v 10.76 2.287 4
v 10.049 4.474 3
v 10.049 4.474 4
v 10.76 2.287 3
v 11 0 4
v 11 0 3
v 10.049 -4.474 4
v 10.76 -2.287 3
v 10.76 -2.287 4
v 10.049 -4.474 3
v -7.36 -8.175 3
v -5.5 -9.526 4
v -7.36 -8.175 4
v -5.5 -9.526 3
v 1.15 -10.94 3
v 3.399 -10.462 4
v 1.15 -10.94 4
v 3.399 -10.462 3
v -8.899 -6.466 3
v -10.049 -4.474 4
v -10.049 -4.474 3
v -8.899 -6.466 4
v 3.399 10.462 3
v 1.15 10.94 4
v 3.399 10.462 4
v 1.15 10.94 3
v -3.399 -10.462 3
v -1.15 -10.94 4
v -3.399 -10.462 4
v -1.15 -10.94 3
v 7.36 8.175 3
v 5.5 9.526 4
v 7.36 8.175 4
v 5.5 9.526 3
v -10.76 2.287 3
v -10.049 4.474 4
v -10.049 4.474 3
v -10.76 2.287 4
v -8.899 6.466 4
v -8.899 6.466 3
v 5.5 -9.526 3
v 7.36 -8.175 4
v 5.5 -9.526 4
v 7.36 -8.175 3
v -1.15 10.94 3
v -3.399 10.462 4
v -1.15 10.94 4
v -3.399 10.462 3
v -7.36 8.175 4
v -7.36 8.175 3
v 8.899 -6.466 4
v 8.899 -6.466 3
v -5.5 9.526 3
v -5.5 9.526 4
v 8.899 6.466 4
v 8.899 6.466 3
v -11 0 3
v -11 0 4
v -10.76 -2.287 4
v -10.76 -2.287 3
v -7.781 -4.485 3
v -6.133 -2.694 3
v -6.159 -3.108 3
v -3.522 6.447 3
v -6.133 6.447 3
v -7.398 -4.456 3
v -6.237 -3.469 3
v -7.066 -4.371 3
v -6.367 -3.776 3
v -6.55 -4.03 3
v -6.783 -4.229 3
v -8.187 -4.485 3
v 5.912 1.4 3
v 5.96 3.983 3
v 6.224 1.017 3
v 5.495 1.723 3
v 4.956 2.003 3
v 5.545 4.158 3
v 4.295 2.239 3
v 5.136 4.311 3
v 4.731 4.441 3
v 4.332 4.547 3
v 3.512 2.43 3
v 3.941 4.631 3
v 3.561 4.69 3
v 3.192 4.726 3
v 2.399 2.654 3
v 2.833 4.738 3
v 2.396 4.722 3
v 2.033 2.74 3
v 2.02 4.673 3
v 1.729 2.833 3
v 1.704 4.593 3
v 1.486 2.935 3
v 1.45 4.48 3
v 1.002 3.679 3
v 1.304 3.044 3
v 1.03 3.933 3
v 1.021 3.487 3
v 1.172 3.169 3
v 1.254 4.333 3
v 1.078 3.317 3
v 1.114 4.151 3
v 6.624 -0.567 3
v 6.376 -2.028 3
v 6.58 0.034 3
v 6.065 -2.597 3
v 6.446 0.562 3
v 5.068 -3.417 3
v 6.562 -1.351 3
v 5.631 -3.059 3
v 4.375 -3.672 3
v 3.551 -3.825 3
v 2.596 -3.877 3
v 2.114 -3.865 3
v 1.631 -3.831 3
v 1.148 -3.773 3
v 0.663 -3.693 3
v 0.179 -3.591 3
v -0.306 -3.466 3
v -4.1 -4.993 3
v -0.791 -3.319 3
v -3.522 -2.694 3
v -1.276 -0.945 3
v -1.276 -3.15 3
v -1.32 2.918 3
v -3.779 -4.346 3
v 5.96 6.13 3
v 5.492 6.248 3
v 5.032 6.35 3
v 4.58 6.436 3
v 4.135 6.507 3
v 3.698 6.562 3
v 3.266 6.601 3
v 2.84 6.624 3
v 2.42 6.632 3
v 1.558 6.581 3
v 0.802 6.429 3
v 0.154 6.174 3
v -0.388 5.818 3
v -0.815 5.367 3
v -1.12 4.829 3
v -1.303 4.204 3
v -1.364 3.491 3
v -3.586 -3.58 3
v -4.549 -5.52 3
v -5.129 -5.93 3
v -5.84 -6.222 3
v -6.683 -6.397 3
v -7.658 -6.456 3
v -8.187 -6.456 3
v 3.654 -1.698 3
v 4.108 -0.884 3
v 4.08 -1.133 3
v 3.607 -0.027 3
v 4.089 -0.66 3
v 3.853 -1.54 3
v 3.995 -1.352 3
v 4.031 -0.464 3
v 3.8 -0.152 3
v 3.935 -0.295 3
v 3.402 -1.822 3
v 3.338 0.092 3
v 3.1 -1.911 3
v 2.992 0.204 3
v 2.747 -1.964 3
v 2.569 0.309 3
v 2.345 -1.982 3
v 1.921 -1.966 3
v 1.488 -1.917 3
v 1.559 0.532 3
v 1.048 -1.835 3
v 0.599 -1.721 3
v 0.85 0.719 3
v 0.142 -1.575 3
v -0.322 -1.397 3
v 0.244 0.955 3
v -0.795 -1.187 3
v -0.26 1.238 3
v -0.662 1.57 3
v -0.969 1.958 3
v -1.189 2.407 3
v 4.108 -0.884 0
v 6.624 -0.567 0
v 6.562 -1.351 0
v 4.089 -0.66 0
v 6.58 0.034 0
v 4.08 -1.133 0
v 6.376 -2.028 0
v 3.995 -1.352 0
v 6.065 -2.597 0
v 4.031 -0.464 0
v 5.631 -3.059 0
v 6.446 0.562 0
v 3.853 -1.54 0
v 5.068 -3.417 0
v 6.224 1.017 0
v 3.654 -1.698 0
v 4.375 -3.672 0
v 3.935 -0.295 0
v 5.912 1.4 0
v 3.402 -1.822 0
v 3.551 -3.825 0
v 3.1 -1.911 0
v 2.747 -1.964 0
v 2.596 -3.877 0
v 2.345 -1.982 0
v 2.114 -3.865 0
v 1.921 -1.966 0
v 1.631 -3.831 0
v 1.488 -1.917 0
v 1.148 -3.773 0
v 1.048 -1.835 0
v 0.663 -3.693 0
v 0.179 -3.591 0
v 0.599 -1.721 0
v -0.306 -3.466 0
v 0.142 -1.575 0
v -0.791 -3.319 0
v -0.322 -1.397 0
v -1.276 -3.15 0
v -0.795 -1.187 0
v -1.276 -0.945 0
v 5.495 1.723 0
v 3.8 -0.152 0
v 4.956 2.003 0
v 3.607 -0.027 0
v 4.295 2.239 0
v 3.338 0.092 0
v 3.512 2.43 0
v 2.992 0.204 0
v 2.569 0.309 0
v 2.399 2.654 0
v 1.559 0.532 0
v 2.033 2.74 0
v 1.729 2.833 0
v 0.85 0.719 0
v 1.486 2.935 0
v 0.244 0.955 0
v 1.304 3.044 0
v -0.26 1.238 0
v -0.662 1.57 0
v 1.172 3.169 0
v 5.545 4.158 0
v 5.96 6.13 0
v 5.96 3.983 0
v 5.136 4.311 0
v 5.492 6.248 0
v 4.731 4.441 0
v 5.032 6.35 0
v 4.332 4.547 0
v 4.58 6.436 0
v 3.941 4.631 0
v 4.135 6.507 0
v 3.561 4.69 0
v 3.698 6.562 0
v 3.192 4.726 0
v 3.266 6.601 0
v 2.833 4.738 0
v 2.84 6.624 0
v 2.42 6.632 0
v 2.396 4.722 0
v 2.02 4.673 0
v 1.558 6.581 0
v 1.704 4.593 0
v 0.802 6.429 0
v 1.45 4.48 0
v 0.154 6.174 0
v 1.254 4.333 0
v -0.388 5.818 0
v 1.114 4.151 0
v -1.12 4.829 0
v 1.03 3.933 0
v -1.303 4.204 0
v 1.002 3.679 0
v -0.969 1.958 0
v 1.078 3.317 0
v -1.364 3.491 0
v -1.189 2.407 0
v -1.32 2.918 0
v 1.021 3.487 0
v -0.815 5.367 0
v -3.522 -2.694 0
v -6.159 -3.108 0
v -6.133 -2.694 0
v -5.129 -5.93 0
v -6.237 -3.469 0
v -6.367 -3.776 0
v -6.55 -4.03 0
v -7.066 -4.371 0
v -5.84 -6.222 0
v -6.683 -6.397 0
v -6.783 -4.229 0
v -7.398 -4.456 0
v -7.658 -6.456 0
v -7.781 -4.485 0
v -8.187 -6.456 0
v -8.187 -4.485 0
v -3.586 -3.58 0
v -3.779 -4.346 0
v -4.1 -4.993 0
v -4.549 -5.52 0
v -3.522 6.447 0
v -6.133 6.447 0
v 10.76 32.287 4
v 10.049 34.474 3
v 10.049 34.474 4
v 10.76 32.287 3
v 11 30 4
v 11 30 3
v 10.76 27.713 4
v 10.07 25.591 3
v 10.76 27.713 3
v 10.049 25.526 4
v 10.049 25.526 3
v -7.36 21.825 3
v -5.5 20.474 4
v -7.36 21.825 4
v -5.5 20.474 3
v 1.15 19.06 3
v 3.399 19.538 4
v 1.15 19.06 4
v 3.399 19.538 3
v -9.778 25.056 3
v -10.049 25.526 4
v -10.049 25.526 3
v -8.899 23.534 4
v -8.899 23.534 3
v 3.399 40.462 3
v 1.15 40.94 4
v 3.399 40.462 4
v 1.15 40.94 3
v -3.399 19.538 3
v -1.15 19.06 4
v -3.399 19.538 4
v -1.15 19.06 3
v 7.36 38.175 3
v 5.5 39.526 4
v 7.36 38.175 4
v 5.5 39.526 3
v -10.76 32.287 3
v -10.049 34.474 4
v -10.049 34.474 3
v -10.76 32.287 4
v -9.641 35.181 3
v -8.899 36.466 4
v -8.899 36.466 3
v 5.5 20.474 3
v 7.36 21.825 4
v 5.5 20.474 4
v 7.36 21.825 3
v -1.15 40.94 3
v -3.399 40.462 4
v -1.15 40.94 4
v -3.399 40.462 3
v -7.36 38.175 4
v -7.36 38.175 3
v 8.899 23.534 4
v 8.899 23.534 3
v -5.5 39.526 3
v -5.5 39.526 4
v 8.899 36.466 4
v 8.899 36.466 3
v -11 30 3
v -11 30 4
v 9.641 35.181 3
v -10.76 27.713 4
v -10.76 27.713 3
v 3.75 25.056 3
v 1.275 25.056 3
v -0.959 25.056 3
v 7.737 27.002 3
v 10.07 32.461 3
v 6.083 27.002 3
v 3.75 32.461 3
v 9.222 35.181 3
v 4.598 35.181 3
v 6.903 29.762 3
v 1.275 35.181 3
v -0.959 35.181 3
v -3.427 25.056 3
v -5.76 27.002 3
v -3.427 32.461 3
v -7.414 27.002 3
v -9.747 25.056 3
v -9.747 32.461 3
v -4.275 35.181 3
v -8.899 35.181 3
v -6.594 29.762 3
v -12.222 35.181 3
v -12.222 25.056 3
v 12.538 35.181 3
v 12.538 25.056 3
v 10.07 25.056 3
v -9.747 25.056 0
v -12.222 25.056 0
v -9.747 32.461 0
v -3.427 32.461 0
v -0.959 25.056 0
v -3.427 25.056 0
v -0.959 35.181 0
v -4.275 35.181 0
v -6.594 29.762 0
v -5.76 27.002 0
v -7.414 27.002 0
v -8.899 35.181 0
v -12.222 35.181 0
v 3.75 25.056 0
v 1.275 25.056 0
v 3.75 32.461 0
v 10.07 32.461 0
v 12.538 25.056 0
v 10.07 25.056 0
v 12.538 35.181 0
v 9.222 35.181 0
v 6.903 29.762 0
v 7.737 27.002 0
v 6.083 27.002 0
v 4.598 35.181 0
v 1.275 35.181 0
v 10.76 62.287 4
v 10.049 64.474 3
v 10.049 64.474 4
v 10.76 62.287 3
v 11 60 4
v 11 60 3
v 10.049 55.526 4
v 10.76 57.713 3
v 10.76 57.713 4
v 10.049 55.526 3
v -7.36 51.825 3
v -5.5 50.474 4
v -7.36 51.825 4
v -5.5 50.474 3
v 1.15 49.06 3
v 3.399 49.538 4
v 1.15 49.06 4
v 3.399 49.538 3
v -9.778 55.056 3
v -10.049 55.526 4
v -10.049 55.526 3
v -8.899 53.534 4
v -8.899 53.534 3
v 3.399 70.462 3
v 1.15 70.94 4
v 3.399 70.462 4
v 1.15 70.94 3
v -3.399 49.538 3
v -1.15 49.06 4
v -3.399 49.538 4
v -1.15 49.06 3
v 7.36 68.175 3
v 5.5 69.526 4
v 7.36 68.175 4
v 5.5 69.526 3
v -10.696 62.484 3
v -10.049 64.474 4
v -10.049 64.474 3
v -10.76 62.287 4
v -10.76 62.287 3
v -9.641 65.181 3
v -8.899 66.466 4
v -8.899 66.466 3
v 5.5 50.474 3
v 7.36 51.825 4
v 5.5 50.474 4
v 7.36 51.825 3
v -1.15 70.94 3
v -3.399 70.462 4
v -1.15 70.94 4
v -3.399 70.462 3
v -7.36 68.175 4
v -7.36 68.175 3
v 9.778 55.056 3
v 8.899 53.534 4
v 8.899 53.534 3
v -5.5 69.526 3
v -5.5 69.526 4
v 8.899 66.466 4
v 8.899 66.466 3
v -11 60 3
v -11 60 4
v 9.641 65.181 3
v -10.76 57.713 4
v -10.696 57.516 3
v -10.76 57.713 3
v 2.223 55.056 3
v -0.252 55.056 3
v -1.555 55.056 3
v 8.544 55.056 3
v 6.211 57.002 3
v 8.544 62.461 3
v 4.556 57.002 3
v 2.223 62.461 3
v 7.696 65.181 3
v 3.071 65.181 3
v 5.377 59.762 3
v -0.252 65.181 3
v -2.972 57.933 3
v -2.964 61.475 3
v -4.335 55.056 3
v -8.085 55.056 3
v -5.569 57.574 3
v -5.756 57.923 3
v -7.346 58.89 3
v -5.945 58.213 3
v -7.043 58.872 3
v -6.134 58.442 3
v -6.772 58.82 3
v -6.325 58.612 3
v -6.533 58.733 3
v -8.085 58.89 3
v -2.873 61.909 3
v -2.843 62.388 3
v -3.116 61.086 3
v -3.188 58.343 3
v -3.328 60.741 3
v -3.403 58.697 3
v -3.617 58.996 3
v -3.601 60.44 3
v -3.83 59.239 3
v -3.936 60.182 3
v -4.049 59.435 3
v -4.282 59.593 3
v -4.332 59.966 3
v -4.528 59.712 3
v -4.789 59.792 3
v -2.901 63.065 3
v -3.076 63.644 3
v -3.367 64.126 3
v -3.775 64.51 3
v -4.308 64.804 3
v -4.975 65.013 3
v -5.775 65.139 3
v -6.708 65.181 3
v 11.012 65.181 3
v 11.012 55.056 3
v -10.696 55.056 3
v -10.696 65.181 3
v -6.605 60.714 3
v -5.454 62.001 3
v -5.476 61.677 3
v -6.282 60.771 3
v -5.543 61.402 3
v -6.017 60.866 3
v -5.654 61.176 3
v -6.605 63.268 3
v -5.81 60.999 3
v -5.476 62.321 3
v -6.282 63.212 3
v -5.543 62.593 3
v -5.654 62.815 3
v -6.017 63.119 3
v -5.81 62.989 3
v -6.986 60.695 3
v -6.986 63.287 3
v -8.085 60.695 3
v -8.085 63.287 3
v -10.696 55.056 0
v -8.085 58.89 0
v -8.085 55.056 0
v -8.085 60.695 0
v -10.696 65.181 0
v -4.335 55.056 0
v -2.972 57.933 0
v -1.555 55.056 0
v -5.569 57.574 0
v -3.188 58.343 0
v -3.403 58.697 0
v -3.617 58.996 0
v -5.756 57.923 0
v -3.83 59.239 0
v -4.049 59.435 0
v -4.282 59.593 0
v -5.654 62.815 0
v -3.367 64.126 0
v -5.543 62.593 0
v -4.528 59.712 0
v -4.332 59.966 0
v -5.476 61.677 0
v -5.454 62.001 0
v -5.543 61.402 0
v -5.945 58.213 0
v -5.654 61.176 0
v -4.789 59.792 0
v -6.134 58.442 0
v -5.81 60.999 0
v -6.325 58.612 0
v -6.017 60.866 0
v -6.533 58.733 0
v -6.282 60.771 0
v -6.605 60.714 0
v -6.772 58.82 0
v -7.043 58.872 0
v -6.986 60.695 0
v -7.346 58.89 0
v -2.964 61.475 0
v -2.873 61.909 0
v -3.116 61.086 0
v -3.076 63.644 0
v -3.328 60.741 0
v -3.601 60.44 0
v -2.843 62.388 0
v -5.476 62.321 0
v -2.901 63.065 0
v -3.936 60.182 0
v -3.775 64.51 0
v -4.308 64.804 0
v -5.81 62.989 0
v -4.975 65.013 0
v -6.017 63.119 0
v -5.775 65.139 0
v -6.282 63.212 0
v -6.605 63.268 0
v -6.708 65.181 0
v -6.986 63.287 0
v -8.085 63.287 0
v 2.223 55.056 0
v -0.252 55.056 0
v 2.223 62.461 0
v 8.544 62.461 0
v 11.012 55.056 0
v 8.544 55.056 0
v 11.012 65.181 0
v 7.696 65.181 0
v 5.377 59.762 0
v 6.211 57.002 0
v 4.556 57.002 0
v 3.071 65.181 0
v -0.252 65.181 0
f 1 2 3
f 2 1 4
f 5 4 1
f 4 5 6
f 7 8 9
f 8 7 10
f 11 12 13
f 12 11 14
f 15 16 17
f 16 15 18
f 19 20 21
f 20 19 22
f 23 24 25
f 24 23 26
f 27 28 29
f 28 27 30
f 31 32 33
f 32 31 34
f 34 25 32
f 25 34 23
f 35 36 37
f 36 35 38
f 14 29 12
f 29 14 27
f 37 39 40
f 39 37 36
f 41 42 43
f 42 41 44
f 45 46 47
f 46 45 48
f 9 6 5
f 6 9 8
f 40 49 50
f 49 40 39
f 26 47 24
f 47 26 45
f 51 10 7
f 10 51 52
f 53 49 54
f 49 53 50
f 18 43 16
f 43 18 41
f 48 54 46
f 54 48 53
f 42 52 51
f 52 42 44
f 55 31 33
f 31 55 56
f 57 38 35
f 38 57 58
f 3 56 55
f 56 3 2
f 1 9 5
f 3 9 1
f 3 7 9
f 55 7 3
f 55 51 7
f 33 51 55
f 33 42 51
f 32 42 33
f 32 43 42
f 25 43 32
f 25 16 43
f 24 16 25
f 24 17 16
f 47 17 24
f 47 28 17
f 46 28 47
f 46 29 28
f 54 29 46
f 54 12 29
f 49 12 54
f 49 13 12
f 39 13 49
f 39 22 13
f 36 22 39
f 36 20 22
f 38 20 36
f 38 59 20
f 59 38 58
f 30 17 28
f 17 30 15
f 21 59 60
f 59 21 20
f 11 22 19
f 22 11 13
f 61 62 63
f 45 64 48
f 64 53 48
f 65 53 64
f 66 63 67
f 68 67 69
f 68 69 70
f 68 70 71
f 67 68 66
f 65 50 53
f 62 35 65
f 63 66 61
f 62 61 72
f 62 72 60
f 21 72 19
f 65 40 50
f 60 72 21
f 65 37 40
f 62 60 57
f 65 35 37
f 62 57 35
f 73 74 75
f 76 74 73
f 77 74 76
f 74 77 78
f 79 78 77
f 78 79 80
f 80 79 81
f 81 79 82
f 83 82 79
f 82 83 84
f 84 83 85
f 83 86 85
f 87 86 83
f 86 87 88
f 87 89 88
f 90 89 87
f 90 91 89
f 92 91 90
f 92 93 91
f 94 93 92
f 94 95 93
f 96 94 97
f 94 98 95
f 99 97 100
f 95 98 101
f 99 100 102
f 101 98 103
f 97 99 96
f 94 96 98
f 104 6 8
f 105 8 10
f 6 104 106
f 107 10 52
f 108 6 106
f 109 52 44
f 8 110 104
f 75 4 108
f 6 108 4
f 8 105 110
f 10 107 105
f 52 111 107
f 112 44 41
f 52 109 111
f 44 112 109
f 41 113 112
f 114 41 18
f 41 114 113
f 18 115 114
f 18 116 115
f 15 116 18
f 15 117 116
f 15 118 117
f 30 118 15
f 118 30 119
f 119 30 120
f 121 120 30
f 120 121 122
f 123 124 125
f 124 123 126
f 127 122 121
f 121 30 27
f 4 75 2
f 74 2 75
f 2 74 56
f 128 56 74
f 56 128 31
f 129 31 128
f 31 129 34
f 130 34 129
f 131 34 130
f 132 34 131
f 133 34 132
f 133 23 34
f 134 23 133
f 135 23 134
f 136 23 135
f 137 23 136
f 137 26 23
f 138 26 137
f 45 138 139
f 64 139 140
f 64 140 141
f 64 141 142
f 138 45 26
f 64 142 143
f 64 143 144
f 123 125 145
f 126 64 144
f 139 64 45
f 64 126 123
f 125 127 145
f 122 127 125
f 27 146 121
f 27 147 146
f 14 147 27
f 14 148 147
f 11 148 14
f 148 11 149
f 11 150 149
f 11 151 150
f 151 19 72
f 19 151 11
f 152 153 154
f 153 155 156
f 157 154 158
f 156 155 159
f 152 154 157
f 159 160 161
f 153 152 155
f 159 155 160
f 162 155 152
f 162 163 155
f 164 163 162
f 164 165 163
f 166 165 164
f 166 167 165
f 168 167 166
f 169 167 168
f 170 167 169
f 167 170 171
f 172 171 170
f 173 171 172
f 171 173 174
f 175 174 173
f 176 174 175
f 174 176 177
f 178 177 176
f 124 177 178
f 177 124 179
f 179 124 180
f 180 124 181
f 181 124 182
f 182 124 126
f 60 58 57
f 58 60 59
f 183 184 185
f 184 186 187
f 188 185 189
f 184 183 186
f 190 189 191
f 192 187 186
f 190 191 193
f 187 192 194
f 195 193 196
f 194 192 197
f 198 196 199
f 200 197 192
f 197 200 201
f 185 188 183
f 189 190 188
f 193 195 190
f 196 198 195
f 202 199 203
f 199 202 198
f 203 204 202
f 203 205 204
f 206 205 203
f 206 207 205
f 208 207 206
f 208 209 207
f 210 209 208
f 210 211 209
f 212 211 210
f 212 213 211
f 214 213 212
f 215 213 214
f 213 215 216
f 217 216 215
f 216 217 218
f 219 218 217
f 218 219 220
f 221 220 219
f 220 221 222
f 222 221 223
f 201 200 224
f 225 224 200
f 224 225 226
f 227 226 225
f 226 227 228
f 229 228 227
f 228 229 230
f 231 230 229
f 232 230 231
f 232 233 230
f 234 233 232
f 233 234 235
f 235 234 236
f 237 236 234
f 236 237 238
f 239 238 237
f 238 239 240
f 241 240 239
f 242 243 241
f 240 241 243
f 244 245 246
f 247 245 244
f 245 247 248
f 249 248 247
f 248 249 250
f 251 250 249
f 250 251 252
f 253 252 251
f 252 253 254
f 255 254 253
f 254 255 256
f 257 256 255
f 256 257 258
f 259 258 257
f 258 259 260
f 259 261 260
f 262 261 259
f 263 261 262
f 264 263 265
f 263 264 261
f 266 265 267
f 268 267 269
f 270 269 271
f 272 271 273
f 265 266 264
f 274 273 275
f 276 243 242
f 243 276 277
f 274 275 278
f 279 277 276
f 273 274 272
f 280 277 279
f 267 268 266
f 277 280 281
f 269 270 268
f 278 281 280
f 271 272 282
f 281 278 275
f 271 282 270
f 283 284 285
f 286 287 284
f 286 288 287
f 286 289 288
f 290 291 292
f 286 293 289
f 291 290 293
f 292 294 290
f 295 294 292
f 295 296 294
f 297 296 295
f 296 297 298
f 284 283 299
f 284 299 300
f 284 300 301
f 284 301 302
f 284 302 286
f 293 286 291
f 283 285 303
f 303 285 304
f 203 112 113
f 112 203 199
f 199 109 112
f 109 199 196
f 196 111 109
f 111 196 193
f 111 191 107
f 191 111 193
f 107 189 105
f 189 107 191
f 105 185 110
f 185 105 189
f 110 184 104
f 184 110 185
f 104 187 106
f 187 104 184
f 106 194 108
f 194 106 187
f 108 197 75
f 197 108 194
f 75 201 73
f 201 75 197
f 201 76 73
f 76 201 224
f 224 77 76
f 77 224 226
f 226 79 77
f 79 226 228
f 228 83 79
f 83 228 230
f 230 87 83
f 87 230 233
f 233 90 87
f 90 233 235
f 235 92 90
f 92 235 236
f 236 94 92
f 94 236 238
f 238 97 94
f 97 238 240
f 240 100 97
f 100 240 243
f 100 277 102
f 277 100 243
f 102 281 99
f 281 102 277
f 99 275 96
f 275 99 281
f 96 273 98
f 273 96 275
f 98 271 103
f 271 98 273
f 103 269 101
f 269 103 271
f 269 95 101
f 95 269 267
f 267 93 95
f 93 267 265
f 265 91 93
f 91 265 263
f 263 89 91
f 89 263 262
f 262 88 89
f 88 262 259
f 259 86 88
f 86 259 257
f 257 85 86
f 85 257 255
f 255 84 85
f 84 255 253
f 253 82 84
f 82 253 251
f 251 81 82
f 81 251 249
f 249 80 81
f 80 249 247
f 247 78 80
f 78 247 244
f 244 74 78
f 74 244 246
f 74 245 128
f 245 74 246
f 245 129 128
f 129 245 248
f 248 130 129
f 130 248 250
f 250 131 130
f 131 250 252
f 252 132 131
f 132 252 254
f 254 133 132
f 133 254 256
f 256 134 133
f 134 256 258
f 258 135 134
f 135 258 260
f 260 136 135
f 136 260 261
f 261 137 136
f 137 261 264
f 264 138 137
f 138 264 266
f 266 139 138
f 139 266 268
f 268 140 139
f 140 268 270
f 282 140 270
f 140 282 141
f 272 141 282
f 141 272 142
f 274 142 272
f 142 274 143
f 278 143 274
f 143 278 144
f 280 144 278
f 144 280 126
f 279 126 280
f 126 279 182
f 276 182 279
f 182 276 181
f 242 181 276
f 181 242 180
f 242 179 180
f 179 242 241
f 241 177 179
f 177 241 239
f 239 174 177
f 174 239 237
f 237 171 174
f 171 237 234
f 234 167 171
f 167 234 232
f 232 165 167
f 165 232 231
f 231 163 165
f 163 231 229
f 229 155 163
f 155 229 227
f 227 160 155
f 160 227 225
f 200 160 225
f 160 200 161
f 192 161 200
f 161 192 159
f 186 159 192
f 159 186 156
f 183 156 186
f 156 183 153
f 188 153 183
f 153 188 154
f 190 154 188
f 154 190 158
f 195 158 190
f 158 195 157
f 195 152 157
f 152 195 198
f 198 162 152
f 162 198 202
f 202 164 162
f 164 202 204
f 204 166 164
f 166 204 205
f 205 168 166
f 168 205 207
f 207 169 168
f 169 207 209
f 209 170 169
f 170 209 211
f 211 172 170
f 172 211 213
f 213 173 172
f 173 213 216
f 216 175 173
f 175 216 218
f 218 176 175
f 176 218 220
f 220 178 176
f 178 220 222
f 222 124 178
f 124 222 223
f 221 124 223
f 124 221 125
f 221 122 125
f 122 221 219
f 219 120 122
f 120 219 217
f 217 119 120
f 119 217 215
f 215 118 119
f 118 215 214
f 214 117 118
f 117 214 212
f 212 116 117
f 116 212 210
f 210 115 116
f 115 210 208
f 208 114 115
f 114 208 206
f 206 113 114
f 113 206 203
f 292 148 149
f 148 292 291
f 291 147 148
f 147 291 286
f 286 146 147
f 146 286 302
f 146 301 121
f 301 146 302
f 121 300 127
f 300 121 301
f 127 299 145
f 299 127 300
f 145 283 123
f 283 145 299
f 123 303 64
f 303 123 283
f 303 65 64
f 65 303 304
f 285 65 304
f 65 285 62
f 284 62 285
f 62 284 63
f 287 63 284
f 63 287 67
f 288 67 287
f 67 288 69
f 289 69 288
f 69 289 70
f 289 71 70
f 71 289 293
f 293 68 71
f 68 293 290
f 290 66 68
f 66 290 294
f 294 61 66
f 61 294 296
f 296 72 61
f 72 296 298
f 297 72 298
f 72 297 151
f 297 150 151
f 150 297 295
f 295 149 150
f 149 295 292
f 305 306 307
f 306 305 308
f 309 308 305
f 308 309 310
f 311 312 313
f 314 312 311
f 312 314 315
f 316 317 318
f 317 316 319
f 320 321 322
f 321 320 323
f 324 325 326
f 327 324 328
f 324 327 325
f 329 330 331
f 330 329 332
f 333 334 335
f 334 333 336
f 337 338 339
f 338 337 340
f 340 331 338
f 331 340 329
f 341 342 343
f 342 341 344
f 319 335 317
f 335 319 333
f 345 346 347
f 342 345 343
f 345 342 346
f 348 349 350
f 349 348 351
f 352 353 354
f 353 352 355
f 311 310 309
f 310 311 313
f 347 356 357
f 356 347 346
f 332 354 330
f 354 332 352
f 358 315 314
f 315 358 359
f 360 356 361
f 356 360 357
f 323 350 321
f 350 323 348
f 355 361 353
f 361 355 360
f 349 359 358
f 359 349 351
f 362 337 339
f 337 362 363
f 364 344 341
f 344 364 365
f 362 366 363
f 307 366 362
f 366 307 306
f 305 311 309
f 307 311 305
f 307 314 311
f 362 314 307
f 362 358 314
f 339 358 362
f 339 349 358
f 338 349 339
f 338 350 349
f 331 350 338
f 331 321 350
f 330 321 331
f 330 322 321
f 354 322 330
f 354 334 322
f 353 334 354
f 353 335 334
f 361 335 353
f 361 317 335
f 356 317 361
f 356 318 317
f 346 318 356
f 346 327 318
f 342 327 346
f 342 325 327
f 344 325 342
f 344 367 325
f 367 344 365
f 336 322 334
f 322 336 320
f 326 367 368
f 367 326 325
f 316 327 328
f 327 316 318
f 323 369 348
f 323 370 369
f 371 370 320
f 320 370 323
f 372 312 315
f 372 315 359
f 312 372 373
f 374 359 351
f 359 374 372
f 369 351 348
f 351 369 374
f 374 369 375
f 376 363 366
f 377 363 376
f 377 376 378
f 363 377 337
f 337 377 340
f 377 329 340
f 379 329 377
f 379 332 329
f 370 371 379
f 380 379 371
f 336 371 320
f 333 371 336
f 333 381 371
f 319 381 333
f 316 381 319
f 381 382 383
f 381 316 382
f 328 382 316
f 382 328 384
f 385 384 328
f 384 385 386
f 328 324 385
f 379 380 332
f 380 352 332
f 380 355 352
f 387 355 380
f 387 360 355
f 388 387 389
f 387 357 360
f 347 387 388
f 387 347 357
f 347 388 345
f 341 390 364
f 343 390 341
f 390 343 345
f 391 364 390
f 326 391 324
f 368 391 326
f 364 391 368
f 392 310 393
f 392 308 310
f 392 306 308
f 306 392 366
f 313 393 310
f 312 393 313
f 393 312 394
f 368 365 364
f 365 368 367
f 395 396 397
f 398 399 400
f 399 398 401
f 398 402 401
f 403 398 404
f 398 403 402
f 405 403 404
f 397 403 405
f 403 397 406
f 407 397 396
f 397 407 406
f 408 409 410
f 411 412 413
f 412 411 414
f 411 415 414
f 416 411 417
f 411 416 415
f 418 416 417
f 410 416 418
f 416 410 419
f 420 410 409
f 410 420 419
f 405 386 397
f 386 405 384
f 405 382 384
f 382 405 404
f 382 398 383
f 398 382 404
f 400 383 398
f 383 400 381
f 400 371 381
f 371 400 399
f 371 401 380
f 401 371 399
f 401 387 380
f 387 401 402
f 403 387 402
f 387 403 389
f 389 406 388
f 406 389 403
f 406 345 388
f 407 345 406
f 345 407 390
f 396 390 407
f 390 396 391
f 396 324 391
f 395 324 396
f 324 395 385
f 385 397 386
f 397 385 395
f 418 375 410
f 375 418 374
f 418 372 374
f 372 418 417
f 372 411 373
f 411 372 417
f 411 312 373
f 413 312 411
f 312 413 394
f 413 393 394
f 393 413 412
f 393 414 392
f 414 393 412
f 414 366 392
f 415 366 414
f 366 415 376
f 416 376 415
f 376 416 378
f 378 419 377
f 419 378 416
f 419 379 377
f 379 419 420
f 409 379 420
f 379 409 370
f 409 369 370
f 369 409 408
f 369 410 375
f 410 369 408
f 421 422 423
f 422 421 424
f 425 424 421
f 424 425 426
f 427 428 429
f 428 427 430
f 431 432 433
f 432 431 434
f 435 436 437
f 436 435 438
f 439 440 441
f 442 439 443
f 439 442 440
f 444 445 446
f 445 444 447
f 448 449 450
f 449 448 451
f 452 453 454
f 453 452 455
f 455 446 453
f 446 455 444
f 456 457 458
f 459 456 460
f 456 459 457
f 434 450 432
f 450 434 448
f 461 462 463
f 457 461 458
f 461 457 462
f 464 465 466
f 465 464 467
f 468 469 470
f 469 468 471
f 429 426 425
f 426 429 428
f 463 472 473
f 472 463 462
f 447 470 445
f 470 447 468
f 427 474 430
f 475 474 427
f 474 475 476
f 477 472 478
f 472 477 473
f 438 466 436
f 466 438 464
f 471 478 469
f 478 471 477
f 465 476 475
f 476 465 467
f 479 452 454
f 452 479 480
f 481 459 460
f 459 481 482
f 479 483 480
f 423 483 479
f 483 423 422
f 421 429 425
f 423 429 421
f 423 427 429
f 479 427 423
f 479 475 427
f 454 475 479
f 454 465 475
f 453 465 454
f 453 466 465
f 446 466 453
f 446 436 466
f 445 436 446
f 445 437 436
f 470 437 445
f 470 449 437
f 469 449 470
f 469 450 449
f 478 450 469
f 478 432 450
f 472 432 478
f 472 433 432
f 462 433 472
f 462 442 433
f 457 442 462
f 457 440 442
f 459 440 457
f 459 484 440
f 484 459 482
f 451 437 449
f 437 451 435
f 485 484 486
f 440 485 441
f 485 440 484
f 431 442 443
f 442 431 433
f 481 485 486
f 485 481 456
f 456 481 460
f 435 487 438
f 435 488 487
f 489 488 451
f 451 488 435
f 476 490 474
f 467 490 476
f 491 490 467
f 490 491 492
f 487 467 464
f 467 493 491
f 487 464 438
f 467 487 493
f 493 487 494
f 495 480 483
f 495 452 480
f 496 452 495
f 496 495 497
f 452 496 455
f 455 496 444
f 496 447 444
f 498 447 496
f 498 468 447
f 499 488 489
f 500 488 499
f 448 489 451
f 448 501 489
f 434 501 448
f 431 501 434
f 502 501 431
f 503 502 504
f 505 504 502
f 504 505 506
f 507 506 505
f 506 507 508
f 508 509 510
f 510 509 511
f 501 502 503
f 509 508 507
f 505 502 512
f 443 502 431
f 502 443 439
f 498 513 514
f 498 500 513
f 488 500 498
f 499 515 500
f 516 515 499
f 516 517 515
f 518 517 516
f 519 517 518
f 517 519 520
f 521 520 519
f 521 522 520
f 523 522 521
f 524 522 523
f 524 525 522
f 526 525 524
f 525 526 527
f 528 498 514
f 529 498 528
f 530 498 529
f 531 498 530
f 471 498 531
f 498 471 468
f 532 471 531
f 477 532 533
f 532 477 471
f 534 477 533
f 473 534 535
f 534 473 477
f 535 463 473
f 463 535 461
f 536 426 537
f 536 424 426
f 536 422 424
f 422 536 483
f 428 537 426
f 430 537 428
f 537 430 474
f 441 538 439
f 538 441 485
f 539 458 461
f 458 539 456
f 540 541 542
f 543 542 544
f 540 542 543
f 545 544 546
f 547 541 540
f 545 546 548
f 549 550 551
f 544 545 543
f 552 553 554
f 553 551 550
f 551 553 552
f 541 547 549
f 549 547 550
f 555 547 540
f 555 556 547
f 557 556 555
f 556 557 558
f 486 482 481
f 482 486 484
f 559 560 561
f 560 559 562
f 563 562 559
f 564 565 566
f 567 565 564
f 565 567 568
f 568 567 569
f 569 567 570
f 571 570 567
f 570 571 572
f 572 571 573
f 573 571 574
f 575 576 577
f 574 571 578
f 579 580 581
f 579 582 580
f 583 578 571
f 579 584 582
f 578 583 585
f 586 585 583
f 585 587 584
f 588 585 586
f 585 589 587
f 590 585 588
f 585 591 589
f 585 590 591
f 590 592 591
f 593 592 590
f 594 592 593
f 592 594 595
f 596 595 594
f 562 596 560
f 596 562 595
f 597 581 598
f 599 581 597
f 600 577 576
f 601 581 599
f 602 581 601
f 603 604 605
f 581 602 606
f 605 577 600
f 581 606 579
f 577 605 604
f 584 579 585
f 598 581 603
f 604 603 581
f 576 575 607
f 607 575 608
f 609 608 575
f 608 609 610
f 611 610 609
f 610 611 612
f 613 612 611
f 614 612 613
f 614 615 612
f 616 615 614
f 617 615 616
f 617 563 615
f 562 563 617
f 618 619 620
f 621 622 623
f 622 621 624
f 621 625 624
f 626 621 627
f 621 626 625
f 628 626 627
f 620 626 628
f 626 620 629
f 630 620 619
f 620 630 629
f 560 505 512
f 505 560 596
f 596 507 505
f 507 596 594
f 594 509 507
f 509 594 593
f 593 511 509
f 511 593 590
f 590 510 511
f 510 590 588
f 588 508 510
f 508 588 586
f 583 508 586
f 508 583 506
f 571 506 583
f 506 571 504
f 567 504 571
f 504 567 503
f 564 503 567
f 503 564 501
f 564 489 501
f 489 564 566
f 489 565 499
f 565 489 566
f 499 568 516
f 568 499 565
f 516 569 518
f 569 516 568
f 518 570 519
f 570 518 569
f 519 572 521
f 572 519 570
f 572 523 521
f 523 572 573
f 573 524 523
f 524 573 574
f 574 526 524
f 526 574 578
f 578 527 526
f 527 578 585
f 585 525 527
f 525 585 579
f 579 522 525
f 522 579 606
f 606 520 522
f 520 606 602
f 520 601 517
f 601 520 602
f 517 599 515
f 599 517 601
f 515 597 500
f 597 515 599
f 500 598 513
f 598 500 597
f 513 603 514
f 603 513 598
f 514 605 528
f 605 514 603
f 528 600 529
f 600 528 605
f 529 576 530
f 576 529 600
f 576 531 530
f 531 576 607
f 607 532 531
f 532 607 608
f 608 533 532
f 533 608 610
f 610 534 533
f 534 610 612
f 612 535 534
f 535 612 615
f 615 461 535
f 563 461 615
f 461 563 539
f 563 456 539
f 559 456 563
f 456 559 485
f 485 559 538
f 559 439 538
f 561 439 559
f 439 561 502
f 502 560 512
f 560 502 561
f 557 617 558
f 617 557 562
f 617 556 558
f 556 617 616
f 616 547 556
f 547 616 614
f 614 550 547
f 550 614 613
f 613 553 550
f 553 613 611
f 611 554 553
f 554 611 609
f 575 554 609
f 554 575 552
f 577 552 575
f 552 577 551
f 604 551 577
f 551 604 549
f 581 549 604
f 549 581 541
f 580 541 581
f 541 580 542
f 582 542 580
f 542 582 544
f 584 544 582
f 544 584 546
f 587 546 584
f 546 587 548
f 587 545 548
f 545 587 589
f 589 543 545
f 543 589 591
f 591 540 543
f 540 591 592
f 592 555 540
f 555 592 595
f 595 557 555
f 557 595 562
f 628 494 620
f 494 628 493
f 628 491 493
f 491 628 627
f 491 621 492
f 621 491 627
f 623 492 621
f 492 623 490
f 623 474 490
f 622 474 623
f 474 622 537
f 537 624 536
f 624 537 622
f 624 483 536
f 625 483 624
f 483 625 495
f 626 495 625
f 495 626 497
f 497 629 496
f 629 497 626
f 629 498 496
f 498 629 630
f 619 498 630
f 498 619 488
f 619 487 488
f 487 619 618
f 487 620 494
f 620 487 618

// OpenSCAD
module Name( str_ ) {
    translate( [ 0, 0, 3 ] )
    cylinder( h=1, r=11, center="true" );
    linear_extrude( height=3 ) {
        text(str_, font="PTMono:Bold", halign="center", valign="center");
    }
}

Name( "JS" );
translate( [ 0, 30, 0 ] )
    Name( "MM" );
translate( [ 0, 60, 0 ] )
    Name( "RM" );
